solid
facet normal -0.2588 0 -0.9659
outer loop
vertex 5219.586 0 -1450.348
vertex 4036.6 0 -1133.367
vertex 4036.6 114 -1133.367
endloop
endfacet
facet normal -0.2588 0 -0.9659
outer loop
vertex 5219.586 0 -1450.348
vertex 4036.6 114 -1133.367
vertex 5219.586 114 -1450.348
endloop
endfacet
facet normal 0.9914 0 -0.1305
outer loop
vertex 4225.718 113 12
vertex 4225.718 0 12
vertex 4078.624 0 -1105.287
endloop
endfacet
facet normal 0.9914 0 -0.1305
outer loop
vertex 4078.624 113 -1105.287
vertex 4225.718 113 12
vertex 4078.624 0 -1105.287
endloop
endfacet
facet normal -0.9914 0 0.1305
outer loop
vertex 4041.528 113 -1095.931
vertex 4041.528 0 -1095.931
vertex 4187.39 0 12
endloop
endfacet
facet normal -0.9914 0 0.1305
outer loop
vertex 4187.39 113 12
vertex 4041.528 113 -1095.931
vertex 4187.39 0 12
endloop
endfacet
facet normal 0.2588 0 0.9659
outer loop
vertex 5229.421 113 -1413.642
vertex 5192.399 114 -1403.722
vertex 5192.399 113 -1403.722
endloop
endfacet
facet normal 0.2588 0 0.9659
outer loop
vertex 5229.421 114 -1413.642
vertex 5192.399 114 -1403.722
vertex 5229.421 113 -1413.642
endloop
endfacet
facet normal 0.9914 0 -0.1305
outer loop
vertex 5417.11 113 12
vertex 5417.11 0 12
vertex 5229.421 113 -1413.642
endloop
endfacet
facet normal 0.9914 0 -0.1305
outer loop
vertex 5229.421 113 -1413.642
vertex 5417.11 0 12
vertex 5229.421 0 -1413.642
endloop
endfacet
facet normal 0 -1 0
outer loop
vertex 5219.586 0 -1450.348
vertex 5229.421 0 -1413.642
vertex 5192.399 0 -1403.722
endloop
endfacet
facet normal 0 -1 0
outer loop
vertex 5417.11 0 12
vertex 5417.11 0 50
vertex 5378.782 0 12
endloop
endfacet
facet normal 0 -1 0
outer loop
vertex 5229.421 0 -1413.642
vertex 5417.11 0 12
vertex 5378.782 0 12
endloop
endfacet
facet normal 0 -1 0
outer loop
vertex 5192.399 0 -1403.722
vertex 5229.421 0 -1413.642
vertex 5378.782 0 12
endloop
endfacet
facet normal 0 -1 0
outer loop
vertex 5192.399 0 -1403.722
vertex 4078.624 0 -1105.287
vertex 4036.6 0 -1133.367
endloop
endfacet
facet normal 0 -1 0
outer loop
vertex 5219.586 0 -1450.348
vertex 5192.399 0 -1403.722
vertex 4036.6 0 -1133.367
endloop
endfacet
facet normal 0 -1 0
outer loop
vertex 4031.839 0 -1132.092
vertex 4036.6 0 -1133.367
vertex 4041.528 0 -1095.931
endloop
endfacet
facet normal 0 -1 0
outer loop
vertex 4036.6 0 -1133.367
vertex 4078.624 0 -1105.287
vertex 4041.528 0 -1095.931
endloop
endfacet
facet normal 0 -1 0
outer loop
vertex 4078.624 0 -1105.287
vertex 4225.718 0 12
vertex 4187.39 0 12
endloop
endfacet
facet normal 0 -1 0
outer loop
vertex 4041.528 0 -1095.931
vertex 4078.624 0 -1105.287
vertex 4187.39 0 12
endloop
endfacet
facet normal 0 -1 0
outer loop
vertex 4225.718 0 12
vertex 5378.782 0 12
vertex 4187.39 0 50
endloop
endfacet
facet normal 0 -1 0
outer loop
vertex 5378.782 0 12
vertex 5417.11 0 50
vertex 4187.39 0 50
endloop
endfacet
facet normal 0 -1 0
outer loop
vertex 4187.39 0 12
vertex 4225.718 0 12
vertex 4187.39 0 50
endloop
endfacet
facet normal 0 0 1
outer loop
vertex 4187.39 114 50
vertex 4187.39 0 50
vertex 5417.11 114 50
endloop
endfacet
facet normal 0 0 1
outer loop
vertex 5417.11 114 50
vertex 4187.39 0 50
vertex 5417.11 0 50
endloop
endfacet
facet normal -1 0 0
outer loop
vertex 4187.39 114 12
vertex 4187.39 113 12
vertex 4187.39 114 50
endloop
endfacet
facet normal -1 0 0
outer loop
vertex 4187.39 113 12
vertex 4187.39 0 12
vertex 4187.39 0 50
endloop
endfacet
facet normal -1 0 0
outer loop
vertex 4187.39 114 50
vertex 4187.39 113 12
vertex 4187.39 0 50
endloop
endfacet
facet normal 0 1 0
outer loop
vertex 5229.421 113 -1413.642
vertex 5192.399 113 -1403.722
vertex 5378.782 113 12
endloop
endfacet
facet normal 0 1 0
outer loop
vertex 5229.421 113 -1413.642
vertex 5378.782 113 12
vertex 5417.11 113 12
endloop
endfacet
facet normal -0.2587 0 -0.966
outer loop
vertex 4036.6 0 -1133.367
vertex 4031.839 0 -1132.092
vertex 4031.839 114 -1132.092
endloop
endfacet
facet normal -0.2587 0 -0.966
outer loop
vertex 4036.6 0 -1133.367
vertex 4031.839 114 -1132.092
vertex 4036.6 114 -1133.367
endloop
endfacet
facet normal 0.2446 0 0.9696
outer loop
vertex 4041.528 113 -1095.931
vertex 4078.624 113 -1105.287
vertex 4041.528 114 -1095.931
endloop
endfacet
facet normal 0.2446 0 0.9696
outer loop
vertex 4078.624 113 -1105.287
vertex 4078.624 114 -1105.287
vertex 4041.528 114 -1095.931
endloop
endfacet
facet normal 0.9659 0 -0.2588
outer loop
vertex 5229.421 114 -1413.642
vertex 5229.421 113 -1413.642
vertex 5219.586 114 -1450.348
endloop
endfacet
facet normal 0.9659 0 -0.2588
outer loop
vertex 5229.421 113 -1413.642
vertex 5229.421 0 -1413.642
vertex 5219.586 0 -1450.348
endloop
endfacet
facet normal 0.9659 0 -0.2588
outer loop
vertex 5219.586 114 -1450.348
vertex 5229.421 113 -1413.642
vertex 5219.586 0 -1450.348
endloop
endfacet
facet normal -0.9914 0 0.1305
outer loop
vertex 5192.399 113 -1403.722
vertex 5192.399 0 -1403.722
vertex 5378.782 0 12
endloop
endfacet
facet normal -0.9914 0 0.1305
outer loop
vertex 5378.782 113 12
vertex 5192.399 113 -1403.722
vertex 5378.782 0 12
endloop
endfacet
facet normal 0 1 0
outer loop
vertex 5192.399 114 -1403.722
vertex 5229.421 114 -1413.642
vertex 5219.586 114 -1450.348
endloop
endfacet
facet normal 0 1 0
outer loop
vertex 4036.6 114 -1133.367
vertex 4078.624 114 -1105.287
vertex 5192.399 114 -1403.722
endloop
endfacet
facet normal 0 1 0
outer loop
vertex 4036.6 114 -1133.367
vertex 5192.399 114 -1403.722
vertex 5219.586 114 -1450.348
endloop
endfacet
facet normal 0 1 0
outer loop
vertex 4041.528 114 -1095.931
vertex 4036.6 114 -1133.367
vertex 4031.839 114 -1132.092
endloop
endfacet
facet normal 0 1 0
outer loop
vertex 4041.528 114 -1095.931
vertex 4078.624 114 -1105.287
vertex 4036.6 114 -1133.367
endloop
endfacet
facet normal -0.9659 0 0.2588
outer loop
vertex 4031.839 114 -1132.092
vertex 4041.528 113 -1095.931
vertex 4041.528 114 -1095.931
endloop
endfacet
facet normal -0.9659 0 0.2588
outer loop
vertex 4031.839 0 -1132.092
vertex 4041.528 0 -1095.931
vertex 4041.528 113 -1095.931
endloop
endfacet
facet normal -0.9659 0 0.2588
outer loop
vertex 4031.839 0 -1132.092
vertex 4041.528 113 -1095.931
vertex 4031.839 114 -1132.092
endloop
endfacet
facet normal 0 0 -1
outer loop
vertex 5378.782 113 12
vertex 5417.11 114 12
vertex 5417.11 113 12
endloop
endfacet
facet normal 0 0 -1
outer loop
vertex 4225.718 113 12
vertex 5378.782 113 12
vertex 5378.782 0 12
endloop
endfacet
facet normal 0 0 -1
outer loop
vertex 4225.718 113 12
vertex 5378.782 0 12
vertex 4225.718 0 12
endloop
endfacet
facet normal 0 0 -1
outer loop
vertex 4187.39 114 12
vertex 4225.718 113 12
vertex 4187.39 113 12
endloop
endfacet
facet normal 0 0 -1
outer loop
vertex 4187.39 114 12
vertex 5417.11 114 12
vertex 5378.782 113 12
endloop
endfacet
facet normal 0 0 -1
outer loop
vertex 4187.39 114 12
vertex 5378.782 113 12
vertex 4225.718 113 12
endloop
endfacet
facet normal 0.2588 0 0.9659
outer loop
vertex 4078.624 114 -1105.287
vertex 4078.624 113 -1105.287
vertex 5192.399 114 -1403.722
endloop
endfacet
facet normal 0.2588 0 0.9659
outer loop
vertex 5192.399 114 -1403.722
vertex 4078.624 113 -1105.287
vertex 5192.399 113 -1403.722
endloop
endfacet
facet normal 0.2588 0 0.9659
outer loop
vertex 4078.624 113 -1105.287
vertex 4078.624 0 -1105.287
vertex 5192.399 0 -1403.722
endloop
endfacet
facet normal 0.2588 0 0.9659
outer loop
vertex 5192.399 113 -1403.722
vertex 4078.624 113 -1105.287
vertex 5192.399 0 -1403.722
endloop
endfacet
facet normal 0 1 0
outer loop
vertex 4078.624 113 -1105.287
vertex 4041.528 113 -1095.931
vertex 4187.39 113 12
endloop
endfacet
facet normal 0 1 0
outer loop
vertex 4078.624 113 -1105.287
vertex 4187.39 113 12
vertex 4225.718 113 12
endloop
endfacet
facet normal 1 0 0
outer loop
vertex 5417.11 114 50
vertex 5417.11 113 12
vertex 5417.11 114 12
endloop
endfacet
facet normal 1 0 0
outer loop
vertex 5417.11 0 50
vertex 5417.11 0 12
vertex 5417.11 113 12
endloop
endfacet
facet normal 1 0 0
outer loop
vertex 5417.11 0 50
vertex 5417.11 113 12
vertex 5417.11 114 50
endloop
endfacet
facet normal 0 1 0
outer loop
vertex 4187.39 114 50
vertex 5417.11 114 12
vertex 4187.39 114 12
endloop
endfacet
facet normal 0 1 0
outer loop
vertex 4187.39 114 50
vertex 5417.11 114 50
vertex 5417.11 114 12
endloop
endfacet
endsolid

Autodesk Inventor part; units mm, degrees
ref_plane "YZ Plane" through (0, 0, 0) normal (1, 0, 0) x (0, 1, 0)
ref_plane "XZ Plane" through (0, 0, 0) normal (0, 1, 0) x (-1, 0, 0)
ref_plane "XY Plane" through (0, 0, 0) normal (0, 0, 1) x (1, 0, 0)
sketch "Sketch1" plane through (0, 0, 0) normal (0, 1, 0) x (-1, 0, 0)
  line L0 (0, 0) -> (-12922.0343, 0) construction
  line L1 (0, 0) -> (-12360.1465, -3311.8913) construction
  line L2 (0, 0) -> (13412.8311, 0) construction
  line L3 (-4192.3928, 50) -> (-5417.1104, 50)
  line L4 (-4036.5995, -1133.3674) -> (-5219.5859, -1450.3476)
  line L5 (-5417.1104, 12) -> (-5229.4211, -1413.6425)
  line L6 (-4041.5281, -1095.9314) -> (-4187.39, 12)
  line L7 (0, 0) -> (-4114.4962, -541.6837) construction
  line L8 (0, 0) -> (4150, 0) construction
  line L9 (-5378.7825, 12) -> (-4225.7179, 12)
  line L10 (-4225.7179, 12) -> (-4078.6242, -1105.2874)
  line L11 (-4078.6242, -1105.2874) -> (-5192.3991, -1403.7225)
  line L12 (-5192.3991, -1403.7225) -> (-5378.7825, 12)
  line L13 (-5378.7825, 12) -> (-5445.5914, 12) construction
  line L14 (-5417.1104, 12) -> (-5417.1104, 50)
  line L15 (-4225.7179, 12) -> (-4187.39, 12) construction
  line L16 (-4187.39, 12) -> (-4187.39, 50)
  line L17 (-4187.39, 50) -> (-4192.3928, 50)
  line L18 (-4076.4449, -1105.2874) -> (-4041.5281, -1095.9314) construction
  line L19 (-4041.5281, -1095.9314) -> (-4031.8389, -1132.0918)
  line L20 (-4031.8389, -1132.0918) -> (-4036.5995, -1133.3674)
  line L21 (-5192.3991, -1403.7225) -> (-5229.4211, -1413.6425) construction
  line L22 (-5229.4211, -1413.6425) -> (-5219.5859, -1450.3476)
  dimension "d0" = 165
  dimension "d3" = 50
  dimension "d4" = 50
  dimension "d6" = 4150
  dimension "d7" = 172.5
  dimension "d10" = 38
extrude "Extrusion2" add sketch "Sketch1" along normal blind 114
sketch "Sketch2" plane through (0, 114, 0) normal (0, 1, 0) x (1, 0, 0)
  line L0 (4225.7179, -12) -> (4078.6242, 1105.2874) projected
  line L1 (4041.5281, 1095.9314) -> (4187.39, -12) projected
  line L2 (4187.39, -12) -> (4187.39, -50) projected
  line L3 (4078.6242, 1105.2874) -> (4041.5281, 1095.9314)
  line L4 (4225.7179, -12) -> (4187.39, -12)
  point P0 (0, 0)
extrude "Extrusion3" cut sketch "Sketch2" against normal blind 1
sketch "Sketch3" plane through (0, 114, 0) normal (0, 1, 0) x (1, 0, 0)
  line L0 (5192.3991, 1403.7225) -> (5378.7825, -12) projected
  line L1 (5417.1104, -50) -> (5417.1104, -12) projected
  line L2 (5417.1104, -12) -> (5229.4211, 1413.6425) projected
  line L3 (4031.8389, 1132.0918) -> (4041.5281, 1095.9314) projected
  line L4 (5192.3991, 1403.7225) -> (5229.4211, 1413.6425)
  line L5 (5378.7825, -12) -> (5417.1104, -12)
  point P0 (0, 0)
extrude "Extrusion4" cut sketch "Sketch3" against normal blind 1
properties part number "panelCflat" material "Wood (Birch)"
